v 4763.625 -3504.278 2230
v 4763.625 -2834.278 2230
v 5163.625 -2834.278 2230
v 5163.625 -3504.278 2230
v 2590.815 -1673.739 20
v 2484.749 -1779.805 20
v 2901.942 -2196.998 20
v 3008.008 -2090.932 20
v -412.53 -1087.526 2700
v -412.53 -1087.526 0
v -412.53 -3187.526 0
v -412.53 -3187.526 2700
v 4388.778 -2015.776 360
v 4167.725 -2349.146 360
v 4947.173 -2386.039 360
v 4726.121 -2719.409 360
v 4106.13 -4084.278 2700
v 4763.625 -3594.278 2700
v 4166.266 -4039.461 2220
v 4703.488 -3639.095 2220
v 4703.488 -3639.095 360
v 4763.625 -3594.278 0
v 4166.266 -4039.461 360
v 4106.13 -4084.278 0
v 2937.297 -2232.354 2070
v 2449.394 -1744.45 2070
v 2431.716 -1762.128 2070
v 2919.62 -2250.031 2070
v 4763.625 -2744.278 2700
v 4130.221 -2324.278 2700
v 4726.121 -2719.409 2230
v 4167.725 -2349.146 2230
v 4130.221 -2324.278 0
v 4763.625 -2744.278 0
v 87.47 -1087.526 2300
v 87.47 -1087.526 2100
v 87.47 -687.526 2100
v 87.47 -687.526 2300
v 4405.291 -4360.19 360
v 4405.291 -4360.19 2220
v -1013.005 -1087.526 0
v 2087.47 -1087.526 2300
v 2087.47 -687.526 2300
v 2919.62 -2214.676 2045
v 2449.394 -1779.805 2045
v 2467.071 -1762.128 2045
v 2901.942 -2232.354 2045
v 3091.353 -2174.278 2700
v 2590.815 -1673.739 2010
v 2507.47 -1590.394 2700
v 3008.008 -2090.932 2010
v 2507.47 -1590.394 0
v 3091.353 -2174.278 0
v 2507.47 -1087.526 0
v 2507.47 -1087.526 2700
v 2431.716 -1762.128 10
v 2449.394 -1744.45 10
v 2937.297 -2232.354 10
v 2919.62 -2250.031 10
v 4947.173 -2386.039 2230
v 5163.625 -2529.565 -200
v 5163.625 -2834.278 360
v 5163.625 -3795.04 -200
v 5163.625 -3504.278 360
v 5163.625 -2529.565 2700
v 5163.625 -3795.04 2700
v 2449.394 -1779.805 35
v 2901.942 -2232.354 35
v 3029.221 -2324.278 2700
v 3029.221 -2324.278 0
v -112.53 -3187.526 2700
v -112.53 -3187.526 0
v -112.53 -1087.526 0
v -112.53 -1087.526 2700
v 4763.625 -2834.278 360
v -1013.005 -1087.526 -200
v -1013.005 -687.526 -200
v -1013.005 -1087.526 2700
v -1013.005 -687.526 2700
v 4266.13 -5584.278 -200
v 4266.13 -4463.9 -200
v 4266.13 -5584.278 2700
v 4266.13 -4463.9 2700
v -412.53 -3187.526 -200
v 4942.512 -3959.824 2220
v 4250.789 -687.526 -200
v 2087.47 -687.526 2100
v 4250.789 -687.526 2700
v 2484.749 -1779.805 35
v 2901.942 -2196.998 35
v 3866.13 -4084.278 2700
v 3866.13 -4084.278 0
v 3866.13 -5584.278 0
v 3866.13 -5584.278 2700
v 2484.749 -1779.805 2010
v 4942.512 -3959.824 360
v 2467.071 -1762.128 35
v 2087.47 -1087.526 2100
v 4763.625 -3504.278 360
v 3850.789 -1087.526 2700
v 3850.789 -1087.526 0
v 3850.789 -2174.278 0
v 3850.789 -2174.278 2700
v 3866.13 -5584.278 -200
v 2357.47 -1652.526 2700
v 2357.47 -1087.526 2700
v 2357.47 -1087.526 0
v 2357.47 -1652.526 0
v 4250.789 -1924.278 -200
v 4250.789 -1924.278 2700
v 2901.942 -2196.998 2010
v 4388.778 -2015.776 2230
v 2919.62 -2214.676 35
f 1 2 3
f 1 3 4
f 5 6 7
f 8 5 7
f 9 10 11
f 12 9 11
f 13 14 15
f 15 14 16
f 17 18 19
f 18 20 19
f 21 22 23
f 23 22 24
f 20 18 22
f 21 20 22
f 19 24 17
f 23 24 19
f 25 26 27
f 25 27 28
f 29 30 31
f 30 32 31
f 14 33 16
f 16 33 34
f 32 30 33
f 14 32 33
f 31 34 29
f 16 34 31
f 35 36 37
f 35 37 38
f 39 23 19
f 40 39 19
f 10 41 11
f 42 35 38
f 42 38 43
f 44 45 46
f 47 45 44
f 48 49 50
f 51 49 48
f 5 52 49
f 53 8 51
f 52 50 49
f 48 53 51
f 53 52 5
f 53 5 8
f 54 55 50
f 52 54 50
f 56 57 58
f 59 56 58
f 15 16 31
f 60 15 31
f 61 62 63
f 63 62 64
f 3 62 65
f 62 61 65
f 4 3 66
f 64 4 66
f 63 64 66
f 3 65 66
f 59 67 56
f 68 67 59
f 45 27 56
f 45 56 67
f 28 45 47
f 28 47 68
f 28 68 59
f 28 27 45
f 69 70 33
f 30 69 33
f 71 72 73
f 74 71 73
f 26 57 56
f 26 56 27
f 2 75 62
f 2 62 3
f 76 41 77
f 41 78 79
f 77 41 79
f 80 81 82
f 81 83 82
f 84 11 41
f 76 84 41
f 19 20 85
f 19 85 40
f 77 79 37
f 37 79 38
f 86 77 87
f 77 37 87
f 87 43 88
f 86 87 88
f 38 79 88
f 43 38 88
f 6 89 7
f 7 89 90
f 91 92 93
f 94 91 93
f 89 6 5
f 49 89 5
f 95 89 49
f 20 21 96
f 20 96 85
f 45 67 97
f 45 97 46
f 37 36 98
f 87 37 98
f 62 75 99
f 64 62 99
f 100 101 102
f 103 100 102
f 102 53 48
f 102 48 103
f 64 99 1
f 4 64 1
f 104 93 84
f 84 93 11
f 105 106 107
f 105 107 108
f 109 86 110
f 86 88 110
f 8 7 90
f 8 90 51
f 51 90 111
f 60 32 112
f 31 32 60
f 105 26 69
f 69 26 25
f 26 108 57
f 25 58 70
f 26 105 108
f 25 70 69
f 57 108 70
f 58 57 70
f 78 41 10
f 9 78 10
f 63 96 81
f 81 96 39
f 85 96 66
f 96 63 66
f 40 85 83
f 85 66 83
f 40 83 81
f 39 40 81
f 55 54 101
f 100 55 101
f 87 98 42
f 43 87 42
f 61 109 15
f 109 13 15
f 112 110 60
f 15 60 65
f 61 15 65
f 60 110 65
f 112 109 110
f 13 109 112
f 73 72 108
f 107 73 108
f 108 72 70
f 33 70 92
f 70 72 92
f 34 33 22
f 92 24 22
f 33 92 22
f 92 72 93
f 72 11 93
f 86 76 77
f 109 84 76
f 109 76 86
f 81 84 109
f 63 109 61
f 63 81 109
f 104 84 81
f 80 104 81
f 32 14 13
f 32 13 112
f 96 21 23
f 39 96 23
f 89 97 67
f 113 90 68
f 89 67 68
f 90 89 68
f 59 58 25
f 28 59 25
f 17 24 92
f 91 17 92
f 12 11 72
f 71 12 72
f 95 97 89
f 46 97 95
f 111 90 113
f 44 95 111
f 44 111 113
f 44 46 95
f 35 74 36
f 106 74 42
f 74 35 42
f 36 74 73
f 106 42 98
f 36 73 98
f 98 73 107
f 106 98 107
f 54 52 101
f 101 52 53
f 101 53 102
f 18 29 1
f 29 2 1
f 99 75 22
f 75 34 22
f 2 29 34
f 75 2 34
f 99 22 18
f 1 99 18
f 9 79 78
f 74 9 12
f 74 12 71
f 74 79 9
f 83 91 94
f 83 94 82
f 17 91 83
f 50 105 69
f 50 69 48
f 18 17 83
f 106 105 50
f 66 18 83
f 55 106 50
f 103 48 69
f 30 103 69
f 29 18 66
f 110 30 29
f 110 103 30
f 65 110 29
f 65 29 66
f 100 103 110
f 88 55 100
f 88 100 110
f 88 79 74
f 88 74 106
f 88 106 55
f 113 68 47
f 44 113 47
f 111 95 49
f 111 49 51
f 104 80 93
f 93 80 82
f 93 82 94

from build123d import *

# Parameters (mm, degrees)
F1_DEPTH  = 2700
F3_DEPTH  = 2700
F5_DEPTH  = 2700
F7_DEPTH  = 200
F8_W      = 690
F8_H      = 2060
F9_DEPTH  = 25
F10_W     = 670
F10_H     = 1870
F11_DEPTH = 500
F12_W     = 670
F12_H     = 1870
F13_DEPTH = 500
F14_W     = 670
F14_H     = 1860
F15_DEPTH = 500
F16_W     = 2000
F16_H     = 200
F17_DEPTH = 500
F19_W     = 590
F19_H     = 1990
F20_DEPTH = 300
F21_W     = 640
F21_H     = 2010
F22_DEPTH = 25


with BuildPart() as f1:
    # F0 (on Top) → F1 (new body)
    with BuildSketch(Plane.XY):
        Polygon((-112.5301761598, -3187.5261832562), (-112.5301761598, -1087.5261832562), (2357.4698238402, -1087.5261832562), (2357.4698238402, -1652.5261832562), (3029.2212659674, -2324.2776253835), (4130.2212659674, -2324.2776253835), (4763.624770852, -2744.2776253835), (4763.624770852, -3594.2776253835), (4106.1295237209, -4084.2776253835), (3866.1295237209, -4084.2776253835), (3866.1295237209, -5584.2776253835), (4266.1295237209, -5584.2776253835), (4266.1295237209, -4463.9001414231), (5163.624770852, -3795.0395329044), (5163.624770852, -2529.5645728802), (4250.7893565536, -1924.2776253835), (3194.9066909167, -1924.2776253835), (2757.4698238402, -1486.840758307), (2757.4698238402, -687.5261832562), (-114.0150137984, -687.5261832562), (-1013.0051374435, -687.5261832562), (-1013.0051374435, -1087.5261832562), (-412.5301761598, -1087.5261832562), (-412.5301761598, -3187.5261832562), align=None)
    extrude(amount=F1_DEPTH)

    # F2 (on Top) → F3 (join)
    with BuildSketch(Plane.XY):
        Polygon((3850.7893565536, -1087.5261832562), (3850.7893565536, -1924.2776253835), (4250.7893565536, -1924.2776253835), (4250.7893565536, -687.5261832562), (2757.4698238402, -687.5261832562), (2757.4698238402, -1087.5261832562), align=None)
    extrude(amount=F3_DEPTH)

    # F4 (on Top) → F5 (cut)
    with BuildSketch(Plane.XY):
        Polygon((2757.4698238402, -1486.840758307), (2757.4698238402, -1087.5261832562), (2507.4698238402, -1087.5261832562), (2507.4698238402, -1590.3941489003), (3091.3533003234, -2174.2776253835), (3850.7893565536, -2174.2776253835), (3850.7893565536, -1924.2776253835), (3194.9066909167, -1924.2776253835), align=None)
    extrude(amount=F5_DEPTH, mode=Mode.SUBTRACT)

    # F6 (on face) → F7 (join)
    with BuildSketch(Plane(origin=(0, 0, 0), x_dir=(1, 0, 0), z_dir=(0, 0, -1))):
        Polygon((-1013.0051374435, 1087.5261832562), (-1013.0051374435, 687.5261832562), (4250.7893565536, 687.5261832562), (4250.7893565536, 1924.2776253835), (5163.624770852, 2529.5645728802), (5163.624770852, 3795.0395329044), (4266.1295237209, 4463.9001414231), (4266.1295237209, 5584.2776253835), (3866.1295237209, 5584.2776253835), (3866.1295237209, 4084.2776253835), (4106.1295237209, 4084.2776253835), (4763.624770852, 3594.2776253835), (4763.624770852, 2744.2776253835), (4130.2212659674, 2324.2776253835), (3029.2212659674, 2324.2776253835), (2357.4698238402, 1652.5261832562), (2357.4698238402, 1087.5261832562), (-112.5301761598, 1087.5261832562), (-112.5301761598, 3187.5261832562), (-412.5301761598, 3187.5261832562), (-412.5301761598, 1087.5261832562), align=None)
        Polygon((3850.7893565536, 2174.2776253835), (3850.7893565536, 1087.5261832562), (2507.4698238402, 1087.5261832562), (2507.4698238402, 1590.3941489003), (3091.3533003234, 2174.2776253835), align=None, mode=Mode.SUBTRACT)
        Polygon((-412.5301761598, 3187.5261832562), (-1013.0051374435, 1087.5261832562), (-412.5301761598, 1087.5261832562), align=None)
        Polygon((3866.1295237209, 5584.2776253835), (-412.5301761598, 3187.5261832562), (-112.5301761598, 3187.5261832562), (-112.5301761598, 1087.5261832562), (2357.4698238402, 1087.5261832562), (2357.4698238402, 1652.5261832562), (3029.2212659674, 2324.2776253835), (4130.2212659674, 2324.2776253835), (4763.624770852, 2744.2776253835), (4763.624770852, 3594.2776253835), (4106.1295237209, 4084.2776253835), (3866.1295237209, 4084.2776253835), align=None)
        Polygon((2507.4698238402, 1087.5261832562), (3850.7893565536, 1087.5261832562), (3850.7893565536, 2174.2776253835), (3091.3533003234, 2174.2776253835), (2507.4698238402, 1590.3941489003), align=None)
    extrude(amount=F7_DEPTH)

    # F8 (on face) → F9 (join)
    with BuildSketch(Plane(origin=(352.471820292, 352.471820292, 0), x_dir=(0.7071067812, -0.7071067812, 0), z_dir=(-0.7071067812, -0.7071067812, 0))):
        with Locations((3310.4953691489, 1040)):
            Rectangle(F8_W, F8_H)
    extrude(amount=F9_DEPTH)

    # F10 (on face) → F11 (cut)
    with BuildSketch(Plane(origin=(190.8668312583, 287.8469521076, 0), x_dir=(0.8334256643, -0.5526315789, 0), z_dir=(-0.5526315789, -0.8334256643, 0))):
        with Locations((5106.7016164124, 1295)):
            Rectangle(F10_W, F10_H)
    extrude(amount=-F11_DEPTH, mode=Mode.SUBTRACT)

    # F12 (on face) → F13 (cut)
    with BuildSketch(Plane(origin=(4763.624770852, 0, 0), x_dir=(0, -1, 0), z_dir=(-1, 0, 0))):
        with Locations((3169.2776253835, 1295)):
            Rectangle(F12_W, F12_H)
    extrude(amount=-F13_DEPTH, mode=Mode.SUBTRACT)

    # F14 (on face) → F15 (cut)
    with BuildSketch(Plane(origin=(3423.1474281761, -4593.2717637855, 0), x_dir=(-0.8018234721, -0.5975609756, 0), z_dir=(-0.5975609756, 0.8018234721, 0))):
        with Locations((-1261.7861091626, 1290)):
            Rectangle(F14_W, F14_H)
    extrude(amount=-F15_DEPTH, mode=Mode.SUBTRACT)

    # F16 (on face) → F17 (cut)
    with BuildSketch(Plane.XZ.offset(1087.5261832562)):
        with Locations((1087.4698238402, 2200)):
            Rectangle(F16_W, F16_H)
    extrude(amount=-F17_DEPTH, mode=Mode.SUBTRACT)

    # F19 (on face) → F20 (cut)
    with BuildSketch(Plane(origin=(352.471820292, 352.471820292, 0), x_dir=(0.7071067812, -0.7071067812, 0), z_dir=(-0.7071067812, -0.7071067812, 0))):
        with Locations((3310.4953691489, 1015)):
            Rectangle(F19_W, F19_H)
    extrude(amount=-F20_DEPTH, mode=Mode.SUBTRACT)

    # F21 (on face) → F22 (cut)
    with BuildSketch(Plane(origin=(334.7941507623, 334.7941507623, 0), x_dir=(0.7071067812, -0.7071067812, 0), z_dir=(-0.7071067812, -0.7071067812, 0))):
        with Locations((3310.4953691489, 1040)):
            Rectangle(F21_W, F21_H)
    extrude(amount=-F22_DEPTH, mode=Mode.SUBTRACT)


solid = f1.part
